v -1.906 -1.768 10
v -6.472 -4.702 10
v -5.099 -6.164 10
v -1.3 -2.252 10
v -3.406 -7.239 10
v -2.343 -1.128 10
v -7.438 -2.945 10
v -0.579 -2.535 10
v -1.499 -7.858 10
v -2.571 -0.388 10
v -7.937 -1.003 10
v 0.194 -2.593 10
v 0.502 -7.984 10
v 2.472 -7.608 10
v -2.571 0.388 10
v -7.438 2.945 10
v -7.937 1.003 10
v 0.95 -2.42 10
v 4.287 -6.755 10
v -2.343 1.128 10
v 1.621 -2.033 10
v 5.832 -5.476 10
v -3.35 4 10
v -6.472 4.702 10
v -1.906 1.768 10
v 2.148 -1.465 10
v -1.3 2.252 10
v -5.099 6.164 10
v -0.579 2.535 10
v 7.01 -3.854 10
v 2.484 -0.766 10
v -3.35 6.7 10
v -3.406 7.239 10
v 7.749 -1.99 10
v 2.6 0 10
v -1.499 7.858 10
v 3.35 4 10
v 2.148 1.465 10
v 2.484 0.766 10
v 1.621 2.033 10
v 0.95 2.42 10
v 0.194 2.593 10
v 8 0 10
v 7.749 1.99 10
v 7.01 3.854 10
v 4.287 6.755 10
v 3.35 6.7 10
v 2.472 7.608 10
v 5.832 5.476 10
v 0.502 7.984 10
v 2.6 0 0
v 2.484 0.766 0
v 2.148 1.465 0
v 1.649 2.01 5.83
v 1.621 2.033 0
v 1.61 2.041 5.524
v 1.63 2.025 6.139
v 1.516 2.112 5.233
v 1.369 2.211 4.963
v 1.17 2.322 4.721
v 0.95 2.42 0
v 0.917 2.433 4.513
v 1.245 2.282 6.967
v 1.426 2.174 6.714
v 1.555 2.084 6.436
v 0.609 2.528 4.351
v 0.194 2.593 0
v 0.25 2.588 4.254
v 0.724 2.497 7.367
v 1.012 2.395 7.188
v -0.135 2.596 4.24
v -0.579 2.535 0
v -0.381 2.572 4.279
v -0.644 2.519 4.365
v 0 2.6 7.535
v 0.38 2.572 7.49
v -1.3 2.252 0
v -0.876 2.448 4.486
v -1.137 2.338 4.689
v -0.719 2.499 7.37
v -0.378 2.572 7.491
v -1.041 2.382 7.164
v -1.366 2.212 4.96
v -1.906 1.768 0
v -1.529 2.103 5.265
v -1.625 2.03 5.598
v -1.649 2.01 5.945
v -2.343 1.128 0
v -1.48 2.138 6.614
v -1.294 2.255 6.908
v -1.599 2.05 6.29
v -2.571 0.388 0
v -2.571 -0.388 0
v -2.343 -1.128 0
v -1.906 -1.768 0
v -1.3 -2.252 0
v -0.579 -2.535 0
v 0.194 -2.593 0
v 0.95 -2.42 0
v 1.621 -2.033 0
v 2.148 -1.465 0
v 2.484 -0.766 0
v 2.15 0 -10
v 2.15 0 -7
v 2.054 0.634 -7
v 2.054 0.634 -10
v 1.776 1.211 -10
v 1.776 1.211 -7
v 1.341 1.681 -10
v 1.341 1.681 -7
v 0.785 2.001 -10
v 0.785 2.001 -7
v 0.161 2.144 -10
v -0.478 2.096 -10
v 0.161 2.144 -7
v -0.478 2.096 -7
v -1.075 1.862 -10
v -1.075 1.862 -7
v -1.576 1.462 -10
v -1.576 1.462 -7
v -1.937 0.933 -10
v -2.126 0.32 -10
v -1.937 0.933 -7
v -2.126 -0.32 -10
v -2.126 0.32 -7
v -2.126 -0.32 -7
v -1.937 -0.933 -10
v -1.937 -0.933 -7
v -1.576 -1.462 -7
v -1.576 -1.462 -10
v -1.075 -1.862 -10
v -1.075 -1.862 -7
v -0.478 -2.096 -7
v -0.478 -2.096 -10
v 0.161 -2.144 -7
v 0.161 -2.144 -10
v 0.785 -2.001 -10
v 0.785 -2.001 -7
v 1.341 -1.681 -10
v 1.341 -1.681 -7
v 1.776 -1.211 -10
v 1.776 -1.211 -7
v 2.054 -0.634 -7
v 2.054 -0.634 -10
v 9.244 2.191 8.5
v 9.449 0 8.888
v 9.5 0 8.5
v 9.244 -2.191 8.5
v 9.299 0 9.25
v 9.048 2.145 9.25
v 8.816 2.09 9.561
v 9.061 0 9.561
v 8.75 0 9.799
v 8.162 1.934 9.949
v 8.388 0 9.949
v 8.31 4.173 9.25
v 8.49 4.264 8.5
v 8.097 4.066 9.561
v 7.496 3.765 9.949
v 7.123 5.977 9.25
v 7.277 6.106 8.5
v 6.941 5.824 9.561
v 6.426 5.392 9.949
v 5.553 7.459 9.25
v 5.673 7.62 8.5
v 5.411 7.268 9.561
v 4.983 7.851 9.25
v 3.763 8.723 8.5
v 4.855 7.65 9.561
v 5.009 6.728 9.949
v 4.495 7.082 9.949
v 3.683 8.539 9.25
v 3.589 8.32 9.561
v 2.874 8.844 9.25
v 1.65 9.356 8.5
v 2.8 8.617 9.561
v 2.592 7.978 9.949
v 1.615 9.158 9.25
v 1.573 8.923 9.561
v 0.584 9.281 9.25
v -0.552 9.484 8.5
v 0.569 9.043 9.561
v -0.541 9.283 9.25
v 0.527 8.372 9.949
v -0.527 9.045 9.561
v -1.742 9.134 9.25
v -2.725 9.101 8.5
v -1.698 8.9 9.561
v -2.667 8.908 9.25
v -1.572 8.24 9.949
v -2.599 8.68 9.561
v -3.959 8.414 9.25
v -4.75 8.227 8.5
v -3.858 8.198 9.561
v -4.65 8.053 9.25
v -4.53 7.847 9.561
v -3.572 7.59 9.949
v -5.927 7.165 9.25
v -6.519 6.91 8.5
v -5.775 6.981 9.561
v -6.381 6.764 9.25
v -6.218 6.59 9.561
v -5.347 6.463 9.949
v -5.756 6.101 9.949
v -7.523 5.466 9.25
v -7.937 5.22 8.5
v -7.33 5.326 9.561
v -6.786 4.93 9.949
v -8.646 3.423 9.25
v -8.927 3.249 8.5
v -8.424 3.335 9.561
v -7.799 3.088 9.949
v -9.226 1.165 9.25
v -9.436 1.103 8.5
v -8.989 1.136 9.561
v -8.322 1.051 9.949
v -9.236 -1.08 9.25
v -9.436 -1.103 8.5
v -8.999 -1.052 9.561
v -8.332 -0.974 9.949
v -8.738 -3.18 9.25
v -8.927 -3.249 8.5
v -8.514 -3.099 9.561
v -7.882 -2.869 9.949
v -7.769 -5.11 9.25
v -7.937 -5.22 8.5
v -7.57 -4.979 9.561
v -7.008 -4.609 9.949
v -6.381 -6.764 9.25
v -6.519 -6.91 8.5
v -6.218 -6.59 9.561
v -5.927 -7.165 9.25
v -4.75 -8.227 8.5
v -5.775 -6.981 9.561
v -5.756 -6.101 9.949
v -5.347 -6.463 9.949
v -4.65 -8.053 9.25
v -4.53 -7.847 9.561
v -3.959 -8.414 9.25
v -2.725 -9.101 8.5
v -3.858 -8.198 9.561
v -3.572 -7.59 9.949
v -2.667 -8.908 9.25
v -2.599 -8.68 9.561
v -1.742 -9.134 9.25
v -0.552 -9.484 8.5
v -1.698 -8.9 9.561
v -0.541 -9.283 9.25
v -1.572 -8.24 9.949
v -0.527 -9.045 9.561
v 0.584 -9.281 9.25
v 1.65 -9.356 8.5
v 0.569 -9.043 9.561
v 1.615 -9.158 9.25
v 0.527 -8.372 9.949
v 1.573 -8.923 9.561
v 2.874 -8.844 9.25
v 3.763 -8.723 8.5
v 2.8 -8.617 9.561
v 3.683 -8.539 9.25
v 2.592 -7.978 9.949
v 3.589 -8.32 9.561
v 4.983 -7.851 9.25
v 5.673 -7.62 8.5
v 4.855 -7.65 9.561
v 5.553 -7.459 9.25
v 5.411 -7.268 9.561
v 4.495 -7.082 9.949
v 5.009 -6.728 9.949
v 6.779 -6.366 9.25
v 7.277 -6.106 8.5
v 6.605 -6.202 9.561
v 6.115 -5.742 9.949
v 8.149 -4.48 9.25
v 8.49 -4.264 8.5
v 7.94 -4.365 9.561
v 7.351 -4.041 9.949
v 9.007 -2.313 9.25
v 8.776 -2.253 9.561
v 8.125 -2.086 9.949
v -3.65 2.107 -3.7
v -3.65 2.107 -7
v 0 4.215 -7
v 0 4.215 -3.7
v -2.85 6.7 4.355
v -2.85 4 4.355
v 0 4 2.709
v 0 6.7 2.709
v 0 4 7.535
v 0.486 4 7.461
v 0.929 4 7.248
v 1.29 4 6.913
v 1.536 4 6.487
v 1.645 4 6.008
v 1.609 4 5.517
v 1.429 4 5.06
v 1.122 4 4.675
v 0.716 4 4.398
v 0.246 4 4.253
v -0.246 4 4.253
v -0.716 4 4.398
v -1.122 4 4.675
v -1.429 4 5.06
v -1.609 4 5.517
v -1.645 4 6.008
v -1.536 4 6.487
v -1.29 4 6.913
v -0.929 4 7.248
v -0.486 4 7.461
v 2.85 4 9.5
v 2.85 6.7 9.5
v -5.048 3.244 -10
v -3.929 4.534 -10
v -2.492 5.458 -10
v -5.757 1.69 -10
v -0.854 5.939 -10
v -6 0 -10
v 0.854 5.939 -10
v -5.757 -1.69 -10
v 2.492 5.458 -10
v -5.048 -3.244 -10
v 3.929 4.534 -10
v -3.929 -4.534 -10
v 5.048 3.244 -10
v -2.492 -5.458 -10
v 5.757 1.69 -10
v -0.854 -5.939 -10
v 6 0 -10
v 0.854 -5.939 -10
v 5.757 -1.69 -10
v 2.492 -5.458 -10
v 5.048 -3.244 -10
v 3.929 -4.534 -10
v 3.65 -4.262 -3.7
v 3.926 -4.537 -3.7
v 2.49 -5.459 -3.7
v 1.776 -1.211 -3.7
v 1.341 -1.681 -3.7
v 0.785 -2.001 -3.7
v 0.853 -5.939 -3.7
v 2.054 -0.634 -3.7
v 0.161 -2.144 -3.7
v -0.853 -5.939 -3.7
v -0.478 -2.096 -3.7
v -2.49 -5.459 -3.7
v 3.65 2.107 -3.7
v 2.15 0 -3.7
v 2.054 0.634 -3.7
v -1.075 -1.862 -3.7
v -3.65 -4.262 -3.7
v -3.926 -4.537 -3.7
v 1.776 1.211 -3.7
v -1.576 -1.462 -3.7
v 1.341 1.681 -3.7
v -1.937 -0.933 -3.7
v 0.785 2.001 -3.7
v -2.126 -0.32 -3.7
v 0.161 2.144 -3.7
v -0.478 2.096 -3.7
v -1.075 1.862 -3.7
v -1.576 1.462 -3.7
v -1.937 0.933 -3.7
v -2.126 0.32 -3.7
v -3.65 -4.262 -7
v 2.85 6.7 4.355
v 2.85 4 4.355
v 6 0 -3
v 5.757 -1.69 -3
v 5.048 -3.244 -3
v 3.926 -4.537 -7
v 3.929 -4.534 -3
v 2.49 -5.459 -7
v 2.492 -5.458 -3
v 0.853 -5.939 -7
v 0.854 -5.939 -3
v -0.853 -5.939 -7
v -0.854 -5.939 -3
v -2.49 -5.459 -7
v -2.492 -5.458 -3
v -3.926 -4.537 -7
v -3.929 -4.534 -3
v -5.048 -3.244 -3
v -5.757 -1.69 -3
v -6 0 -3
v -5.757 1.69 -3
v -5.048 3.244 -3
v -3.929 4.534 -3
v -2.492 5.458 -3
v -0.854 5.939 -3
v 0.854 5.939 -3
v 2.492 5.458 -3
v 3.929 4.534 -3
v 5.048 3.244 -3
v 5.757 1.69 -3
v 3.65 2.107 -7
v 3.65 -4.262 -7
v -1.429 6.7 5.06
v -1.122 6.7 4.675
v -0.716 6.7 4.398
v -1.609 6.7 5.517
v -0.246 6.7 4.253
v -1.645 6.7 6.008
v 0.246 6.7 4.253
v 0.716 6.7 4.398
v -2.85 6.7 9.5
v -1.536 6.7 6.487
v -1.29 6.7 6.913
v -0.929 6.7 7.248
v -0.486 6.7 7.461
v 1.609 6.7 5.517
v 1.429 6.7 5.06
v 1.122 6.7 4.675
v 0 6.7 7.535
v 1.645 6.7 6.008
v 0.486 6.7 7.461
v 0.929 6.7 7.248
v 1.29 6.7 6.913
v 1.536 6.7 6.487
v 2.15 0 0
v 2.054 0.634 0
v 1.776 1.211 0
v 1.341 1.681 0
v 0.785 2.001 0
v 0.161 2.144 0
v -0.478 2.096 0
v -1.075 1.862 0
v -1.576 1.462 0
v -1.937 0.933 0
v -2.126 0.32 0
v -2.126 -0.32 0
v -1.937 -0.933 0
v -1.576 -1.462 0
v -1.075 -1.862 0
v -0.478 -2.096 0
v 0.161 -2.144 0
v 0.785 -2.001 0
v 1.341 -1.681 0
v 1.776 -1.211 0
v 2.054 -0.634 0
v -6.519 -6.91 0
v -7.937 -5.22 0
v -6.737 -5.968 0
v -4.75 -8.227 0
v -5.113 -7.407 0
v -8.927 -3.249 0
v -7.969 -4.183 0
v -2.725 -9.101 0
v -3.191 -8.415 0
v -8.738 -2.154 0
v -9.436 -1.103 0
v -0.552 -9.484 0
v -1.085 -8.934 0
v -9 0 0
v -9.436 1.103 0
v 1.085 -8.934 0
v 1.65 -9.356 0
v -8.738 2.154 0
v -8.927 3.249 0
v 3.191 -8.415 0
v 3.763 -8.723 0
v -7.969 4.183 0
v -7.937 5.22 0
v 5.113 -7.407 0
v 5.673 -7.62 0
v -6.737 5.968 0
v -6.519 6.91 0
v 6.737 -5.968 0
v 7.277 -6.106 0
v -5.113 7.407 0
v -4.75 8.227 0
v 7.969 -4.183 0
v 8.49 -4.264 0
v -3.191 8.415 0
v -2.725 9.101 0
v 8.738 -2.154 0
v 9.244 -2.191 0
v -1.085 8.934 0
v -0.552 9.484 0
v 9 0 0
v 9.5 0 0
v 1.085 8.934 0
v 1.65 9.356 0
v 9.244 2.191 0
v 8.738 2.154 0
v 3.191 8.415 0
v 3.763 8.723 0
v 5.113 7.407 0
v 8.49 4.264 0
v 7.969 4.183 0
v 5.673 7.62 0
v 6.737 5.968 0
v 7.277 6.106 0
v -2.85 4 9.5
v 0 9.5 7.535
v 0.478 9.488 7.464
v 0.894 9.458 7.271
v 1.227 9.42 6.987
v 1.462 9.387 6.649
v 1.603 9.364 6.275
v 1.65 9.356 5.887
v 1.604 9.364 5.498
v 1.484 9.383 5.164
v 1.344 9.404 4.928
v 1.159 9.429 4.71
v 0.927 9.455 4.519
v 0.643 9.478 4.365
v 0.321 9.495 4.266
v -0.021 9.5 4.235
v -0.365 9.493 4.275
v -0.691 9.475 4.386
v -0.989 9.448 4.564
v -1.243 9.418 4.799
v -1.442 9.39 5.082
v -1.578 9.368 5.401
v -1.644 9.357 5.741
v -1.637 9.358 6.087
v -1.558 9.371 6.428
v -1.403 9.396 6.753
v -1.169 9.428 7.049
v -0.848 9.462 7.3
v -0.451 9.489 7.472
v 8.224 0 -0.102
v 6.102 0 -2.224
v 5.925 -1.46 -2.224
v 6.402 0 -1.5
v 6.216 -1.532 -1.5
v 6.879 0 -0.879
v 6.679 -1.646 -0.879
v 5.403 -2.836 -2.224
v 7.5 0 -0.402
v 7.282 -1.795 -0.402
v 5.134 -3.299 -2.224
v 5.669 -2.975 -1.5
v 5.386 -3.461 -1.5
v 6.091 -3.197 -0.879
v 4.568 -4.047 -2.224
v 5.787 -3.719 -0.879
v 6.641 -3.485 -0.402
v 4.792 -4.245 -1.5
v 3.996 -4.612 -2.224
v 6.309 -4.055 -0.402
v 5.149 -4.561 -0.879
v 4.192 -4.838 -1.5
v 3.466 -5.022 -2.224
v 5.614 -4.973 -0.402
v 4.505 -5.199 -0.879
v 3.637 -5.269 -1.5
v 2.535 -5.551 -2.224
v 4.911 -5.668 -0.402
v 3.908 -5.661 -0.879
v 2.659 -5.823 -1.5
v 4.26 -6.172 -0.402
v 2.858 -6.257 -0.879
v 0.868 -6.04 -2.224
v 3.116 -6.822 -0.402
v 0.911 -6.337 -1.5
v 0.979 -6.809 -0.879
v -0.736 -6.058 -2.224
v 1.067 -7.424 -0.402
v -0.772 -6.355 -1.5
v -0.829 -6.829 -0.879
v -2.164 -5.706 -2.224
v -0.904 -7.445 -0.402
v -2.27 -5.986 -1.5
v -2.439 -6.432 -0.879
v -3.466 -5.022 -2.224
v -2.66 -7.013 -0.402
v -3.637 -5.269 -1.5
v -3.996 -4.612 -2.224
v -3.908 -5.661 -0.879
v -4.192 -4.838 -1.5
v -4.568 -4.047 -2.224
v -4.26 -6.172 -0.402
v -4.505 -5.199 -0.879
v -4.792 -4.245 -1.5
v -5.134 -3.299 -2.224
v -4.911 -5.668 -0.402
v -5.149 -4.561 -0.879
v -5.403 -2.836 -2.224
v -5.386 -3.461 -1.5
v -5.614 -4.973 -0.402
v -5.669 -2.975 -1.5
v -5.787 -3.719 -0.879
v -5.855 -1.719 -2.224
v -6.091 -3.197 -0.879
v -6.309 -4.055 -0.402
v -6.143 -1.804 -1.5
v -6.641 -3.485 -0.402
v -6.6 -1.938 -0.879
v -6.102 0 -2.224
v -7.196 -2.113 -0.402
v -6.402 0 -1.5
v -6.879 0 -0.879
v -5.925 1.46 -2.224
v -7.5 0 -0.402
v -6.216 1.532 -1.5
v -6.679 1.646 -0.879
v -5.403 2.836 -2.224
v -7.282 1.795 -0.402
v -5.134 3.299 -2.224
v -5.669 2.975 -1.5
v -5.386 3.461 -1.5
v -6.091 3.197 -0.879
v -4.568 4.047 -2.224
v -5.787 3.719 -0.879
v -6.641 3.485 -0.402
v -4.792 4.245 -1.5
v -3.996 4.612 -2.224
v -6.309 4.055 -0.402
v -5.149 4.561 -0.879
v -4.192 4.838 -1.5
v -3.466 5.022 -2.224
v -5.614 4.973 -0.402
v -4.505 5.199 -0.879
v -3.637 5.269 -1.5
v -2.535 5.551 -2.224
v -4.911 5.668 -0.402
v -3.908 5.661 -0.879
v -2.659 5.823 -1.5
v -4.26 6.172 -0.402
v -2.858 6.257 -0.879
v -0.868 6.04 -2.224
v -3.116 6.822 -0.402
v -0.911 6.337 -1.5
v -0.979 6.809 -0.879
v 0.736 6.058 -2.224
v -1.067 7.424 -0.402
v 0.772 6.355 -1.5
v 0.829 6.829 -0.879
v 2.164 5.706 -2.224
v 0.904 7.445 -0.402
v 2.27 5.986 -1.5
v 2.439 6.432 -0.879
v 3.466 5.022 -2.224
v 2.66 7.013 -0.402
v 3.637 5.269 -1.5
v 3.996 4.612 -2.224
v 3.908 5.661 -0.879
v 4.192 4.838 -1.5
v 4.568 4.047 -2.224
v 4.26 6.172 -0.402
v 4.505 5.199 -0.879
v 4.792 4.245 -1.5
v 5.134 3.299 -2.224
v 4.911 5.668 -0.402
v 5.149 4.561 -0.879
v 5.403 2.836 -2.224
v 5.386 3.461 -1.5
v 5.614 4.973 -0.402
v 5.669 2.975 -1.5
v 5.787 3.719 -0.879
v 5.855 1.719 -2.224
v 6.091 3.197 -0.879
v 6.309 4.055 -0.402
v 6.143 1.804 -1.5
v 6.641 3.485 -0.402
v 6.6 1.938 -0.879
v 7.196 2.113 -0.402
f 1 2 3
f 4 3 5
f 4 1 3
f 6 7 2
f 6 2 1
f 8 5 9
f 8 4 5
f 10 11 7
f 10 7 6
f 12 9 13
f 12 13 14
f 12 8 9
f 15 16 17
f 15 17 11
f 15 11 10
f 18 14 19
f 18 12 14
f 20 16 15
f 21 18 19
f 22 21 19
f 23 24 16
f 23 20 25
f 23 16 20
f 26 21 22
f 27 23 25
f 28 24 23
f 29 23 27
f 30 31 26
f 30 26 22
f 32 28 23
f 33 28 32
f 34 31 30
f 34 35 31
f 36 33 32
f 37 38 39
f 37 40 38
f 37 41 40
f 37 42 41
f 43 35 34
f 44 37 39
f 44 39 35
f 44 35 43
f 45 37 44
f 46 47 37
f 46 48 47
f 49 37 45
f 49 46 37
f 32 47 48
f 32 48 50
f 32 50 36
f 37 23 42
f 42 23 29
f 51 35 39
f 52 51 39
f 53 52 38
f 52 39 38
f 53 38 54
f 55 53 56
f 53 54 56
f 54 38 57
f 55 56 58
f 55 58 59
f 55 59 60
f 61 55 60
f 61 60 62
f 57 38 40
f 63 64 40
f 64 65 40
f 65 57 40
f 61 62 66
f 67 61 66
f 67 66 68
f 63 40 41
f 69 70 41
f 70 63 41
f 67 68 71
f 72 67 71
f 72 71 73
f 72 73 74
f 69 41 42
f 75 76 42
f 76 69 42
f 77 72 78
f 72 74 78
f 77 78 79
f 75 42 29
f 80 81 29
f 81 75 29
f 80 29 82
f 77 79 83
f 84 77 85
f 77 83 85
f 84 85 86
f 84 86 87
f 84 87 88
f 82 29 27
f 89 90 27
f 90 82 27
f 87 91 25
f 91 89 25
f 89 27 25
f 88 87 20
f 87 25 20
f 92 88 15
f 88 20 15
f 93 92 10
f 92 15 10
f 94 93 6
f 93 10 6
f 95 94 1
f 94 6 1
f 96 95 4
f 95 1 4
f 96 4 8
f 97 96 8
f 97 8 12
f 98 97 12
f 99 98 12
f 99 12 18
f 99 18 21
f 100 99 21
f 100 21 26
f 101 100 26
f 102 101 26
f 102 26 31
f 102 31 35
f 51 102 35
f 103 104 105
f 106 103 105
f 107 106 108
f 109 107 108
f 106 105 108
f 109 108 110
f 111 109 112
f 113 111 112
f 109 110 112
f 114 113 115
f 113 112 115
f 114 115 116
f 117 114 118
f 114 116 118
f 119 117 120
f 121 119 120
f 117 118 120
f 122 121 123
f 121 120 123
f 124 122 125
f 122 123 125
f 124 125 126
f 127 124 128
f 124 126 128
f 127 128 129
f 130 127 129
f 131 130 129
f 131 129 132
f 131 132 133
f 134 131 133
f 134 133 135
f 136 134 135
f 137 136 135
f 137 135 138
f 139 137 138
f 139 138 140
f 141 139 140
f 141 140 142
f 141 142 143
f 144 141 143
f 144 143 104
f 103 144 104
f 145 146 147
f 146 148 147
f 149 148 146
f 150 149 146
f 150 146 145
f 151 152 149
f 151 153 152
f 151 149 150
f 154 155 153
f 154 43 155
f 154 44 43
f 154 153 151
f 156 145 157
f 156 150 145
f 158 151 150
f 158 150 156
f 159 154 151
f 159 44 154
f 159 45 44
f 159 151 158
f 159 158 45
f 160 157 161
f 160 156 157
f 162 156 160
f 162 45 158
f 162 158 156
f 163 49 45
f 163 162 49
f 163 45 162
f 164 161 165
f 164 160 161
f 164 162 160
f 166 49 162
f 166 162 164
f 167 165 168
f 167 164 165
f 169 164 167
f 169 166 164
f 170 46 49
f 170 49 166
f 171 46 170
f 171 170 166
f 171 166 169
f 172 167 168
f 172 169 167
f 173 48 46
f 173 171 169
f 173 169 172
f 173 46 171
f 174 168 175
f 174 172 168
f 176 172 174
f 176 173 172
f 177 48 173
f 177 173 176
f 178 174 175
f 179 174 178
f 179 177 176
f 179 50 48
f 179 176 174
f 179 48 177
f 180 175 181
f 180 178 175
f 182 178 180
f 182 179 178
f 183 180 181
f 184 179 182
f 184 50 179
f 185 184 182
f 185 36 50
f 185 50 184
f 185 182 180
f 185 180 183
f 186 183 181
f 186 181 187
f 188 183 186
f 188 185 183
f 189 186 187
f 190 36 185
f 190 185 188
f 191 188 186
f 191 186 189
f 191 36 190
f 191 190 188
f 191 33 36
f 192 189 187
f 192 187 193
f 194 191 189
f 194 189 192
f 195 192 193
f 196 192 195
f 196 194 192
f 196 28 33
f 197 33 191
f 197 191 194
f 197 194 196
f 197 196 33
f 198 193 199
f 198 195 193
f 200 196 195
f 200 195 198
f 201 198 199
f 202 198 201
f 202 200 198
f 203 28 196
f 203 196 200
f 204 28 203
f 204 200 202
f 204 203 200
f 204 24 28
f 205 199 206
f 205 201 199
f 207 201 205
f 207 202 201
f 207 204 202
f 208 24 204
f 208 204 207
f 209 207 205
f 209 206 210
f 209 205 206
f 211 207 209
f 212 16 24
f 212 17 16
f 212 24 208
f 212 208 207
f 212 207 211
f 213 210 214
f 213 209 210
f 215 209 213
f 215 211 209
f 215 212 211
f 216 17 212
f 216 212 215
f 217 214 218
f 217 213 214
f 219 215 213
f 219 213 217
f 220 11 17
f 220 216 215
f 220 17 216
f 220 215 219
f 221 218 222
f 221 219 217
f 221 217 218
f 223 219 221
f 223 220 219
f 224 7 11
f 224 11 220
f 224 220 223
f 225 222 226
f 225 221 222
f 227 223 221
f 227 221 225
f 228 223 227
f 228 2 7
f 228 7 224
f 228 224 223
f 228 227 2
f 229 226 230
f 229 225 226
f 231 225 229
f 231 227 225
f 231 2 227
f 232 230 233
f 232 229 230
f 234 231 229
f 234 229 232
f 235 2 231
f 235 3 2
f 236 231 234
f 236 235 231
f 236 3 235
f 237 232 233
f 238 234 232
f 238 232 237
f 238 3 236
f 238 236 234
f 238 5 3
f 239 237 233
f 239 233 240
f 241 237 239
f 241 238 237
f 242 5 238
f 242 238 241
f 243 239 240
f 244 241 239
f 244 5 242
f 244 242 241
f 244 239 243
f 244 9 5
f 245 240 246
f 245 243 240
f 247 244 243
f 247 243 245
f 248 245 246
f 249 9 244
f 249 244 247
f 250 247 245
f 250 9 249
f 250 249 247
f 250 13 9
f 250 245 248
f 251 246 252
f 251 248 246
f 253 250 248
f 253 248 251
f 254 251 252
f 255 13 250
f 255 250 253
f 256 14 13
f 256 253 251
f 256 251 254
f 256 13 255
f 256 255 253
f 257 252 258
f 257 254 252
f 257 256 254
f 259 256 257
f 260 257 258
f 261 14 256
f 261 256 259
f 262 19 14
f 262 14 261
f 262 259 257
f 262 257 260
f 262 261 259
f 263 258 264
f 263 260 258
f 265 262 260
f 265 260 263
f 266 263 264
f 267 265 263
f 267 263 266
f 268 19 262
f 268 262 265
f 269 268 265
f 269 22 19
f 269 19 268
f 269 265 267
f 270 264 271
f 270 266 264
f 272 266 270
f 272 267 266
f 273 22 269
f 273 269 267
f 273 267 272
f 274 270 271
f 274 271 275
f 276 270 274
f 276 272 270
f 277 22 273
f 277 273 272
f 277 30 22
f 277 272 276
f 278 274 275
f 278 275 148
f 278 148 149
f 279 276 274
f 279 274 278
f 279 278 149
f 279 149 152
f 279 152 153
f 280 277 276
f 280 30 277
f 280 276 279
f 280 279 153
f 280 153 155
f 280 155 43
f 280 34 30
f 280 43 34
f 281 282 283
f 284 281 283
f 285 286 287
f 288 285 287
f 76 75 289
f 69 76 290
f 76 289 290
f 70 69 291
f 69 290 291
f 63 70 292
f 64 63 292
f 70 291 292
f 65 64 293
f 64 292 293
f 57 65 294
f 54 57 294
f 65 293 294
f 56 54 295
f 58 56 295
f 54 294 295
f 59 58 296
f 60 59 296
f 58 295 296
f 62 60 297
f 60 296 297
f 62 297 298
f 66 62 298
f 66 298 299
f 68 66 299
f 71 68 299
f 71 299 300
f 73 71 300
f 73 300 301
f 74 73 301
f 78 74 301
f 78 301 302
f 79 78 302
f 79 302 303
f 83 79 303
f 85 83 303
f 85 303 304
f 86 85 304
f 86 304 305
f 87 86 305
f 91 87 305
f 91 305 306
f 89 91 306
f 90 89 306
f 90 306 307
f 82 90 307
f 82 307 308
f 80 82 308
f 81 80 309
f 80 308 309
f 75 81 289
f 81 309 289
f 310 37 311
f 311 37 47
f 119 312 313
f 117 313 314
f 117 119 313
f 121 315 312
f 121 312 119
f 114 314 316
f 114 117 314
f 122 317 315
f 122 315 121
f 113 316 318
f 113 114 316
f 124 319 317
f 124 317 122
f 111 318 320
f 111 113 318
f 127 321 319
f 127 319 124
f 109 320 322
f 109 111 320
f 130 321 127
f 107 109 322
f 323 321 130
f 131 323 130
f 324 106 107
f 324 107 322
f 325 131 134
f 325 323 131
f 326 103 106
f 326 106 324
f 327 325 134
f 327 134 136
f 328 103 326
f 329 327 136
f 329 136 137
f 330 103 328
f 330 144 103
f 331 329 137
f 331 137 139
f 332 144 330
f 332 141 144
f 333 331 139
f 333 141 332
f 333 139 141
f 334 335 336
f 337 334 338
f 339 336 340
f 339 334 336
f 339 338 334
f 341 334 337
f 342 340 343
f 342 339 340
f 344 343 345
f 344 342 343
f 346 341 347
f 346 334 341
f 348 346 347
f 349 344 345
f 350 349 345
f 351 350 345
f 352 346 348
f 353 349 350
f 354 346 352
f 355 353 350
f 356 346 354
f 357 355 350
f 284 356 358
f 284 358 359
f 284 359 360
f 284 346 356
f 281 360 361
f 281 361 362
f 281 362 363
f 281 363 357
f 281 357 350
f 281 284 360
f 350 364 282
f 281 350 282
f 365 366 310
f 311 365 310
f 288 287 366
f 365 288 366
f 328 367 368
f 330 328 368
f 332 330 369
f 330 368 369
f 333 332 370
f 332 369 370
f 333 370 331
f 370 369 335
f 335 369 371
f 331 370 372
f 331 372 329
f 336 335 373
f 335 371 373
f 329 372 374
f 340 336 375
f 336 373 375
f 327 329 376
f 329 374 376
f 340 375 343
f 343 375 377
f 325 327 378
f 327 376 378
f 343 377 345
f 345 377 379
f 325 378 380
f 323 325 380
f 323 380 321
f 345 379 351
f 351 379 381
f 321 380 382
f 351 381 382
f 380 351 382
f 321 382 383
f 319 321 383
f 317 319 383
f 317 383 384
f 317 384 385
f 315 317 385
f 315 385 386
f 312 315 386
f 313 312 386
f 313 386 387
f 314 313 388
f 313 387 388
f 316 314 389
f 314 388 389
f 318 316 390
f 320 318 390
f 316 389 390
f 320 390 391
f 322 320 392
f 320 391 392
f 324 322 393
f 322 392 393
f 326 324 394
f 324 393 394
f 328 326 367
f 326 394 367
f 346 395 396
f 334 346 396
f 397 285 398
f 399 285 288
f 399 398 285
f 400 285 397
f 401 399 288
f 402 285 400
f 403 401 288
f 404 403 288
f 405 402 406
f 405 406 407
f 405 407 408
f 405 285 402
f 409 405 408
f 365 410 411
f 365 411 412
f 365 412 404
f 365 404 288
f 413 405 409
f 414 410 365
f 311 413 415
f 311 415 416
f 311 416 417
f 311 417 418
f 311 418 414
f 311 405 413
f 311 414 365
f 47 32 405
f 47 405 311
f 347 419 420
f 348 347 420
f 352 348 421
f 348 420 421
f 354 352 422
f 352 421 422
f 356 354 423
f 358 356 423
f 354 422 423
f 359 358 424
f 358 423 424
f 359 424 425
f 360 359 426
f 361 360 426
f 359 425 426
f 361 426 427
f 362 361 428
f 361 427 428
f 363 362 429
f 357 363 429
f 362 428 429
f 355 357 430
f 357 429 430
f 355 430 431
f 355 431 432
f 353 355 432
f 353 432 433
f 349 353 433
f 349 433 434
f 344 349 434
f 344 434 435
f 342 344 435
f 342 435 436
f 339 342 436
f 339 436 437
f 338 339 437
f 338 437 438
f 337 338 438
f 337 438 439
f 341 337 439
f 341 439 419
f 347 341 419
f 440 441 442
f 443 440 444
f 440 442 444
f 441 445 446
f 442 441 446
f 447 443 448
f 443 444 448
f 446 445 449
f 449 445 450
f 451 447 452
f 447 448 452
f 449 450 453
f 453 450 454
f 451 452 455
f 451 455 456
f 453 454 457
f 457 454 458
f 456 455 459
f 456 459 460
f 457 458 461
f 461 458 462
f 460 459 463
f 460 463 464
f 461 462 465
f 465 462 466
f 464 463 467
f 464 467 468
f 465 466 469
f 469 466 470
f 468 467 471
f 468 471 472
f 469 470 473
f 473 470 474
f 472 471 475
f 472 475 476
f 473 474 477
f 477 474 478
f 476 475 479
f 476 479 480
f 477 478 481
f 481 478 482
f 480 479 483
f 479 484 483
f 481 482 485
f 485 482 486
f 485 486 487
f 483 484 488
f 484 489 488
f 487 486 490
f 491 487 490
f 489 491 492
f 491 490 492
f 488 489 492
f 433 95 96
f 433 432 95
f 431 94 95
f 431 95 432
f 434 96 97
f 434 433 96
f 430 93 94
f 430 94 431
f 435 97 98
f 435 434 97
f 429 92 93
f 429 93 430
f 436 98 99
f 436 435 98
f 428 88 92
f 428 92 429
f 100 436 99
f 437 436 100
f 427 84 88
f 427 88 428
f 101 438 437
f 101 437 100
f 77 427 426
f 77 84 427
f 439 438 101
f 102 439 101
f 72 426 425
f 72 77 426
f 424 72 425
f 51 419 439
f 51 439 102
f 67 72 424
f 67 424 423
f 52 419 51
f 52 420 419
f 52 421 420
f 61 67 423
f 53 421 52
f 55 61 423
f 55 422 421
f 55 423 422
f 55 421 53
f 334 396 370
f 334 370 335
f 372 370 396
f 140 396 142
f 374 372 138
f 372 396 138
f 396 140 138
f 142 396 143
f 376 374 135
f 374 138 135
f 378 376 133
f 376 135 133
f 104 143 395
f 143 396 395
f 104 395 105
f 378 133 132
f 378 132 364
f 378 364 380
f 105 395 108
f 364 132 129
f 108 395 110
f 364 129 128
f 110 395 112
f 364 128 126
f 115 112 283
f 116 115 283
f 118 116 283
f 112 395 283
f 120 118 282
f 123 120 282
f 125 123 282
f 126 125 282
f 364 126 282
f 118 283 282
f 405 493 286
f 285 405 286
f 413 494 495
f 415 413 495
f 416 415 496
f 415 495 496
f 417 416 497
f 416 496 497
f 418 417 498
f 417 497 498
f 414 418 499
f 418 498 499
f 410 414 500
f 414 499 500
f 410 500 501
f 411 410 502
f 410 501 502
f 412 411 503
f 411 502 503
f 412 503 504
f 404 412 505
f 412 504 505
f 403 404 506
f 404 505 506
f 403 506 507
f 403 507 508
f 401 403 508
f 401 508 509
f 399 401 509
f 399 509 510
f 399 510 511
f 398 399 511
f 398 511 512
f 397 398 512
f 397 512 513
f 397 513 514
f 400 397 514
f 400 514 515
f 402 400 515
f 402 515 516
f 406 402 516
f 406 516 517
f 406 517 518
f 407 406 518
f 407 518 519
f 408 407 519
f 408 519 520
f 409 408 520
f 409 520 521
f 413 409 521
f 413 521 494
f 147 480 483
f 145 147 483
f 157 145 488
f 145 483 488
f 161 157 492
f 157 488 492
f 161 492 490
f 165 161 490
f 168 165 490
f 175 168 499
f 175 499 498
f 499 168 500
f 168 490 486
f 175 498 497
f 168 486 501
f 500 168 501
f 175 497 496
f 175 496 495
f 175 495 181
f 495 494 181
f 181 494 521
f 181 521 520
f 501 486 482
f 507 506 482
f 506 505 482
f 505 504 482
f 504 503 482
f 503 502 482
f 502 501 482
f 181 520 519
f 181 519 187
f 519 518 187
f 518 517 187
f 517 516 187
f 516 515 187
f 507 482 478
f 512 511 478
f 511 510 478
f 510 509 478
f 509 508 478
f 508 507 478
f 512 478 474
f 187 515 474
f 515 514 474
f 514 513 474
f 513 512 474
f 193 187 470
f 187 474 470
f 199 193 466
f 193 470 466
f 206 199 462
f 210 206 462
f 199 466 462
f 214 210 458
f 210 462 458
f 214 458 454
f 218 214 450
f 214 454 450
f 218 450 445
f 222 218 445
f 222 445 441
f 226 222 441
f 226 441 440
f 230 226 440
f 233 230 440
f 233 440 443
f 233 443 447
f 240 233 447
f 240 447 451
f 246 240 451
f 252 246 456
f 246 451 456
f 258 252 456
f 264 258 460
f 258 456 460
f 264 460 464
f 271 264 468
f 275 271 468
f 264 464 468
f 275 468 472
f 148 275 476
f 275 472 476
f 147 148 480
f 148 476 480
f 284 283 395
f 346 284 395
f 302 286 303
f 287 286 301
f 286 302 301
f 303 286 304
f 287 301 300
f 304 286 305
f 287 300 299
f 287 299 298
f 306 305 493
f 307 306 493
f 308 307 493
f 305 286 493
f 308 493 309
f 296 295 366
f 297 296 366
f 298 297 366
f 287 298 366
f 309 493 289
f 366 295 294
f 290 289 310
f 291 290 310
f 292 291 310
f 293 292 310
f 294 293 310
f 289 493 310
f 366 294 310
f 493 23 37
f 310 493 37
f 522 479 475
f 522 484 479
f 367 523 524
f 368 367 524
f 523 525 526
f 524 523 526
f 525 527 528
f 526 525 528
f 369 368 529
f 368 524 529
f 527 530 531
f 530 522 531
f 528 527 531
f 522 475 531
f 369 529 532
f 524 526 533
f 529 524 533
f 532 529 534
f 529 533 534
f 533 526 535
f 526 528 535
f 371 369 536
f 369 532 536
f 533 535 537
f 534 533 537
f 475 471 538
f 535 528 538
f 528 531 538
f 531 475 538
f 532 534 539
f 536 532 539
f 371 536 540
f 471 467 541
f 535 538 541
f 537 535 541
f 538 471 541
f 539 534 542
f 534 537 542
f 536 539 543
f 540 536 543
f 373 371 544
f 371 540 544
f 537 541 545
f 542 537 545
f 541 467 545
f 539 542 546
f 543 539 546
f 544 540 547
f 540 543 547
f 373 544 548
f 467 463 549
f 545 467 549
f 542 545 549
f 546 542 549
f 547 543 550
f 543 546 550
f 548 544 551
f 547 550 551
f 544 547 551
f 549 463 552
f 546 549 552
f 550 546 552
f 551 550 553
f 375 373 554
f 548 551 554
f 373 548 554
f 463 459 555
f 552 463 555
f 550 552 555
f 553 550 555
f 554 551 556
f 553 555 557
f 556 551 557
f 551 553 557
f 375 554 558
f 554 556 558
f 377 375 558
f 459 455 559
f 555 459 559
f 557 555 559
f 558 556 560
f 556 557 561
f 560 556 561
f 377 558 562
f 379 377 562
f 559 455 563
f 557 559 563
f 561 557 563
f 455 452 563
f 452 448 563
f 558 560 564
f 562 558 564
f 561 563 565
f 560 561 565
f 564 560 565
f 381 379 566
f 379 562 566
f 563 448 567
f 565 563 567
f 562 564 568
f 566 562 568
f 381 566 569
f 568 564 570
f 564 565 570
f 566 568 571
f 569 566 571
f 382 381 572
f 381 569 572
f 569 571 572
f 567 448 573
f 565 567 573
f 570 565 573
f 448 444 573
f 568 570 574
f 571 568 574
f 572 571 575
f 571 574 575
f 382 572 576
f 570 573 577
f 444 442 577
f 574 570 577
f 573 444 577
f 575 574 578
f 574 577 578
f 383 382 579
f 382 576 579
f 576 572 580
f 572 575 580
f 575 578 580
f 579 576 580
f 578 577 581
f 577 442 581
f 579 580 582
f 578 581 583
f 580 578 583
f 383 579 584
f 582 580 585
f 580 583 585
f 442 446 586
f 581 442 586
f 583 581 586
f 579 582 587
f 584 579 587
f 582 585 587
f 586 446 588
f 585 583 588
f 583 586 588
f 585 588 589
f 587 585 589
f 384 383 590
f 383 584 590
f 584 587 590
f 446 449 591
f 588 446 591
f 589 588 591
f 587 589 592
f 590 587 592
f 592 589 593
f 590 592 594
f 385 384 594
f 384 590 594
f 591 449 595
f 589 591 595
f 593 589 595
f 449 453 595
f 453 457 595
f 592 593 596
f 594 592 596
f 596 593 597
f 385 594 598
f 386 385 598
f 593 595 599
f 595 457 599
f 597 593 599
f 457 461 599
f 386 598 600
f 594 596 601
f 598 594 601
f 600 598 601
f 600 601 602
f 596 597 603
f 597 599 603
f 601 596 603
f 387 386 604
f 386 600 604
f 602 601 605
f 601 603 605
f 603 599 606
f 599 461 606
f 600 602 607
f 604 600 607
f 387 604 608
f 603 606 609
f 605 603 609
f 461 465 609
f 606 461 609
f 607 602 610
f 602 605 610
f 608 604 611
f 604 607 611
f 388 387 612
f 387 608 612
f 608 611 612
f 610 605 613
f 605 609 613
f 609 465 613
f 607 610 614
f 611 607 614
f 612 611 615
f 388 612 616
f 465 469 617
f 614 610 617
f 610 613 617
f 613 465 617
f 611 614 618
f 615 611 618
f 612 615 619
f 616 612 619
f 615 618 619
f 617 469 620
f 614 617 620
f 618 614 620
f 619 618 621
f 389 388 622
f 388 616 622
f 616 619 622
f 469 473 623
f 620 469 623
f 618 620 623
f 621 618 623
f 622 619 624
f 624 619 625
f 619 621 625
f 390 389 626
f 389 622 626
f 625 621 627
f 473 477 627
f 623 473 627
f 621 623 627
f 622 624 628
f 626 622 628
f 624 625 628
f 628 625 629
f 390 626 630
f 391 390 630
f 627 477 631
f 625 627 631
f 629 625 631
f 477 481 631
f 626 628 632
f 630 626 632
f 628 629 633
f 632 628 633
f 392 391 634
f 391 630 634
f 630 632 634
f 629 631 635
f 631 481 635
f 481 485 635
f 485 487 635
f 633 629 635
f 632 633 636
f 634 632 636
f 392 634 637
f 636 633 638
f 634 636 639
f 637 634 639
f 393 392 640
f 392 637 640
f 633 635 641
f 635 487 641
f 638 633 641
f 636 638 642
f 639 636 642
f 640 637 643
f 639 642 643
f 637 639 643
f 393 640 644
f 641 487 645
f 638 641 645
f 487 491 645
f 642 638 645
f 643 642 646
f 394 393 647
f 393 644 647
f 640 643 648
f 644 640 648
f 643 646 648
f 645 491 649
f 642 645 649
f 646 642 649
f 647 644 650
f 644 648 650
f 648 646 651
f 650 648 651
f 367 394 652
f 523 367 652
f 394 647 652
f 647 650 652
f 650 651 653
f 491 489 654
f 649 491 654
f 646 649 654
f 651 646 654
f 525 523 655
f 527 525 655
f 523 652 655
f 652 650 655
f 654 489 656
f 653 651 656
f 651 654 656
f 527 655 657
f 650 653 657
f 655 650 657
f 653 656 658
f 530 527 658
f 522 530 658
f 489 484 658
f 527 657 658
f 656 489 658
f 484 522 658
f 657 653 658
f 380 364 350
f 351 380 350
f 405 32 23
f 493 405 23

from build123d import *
from OCP.BRepFilletAPI import BRepFilletAPI_MakeChamfer

# Parameters (mm, degrees)
SKETCH1_R               = 9.5
BOSS_EXTRUDE1_DEPTH     = 10
SKETCH6_R               = 6
BOSS_EXTRUDE2_DEPTH     = 10
SKETCH2_R               = 2.6
CUT_EXTRUDE1_DEPTH      = 10
SKETCH3_R               = 2.15
CUT_EXTRUDE2_DEPTH      = 17.748134224
CUT_EXTRUDE3_DEPTH      = 3.3
CUT_EXTRUDE4_DEPTH      = 2.7
CUT_EXTRUDE5_REACH      = 25.479
CUT_EXTRUDE5_END_RADIUS = 2.6
SKETCH7_R               = 1.65
FILLET1_R               = 3
CHAMFER1_SIZE           = 0.356629571
CHAMFER1_SIZE_2         = 0.5
CHAMFER2_SIZE           = 0.5
FILLET2_R               = 1.5


with BuildPart() as part:
    # Sketch1 → Boss-Extrude1 (new body)
    with BuildSketch(Plane.XY):
        Circle(SKETCH1_R)
    extrude(amount=BOSS_EXTRUDE1_DEPTH)

    # Sketch6 → Boss-Extrude2 (add)
    with BuildSketch(Plane(origin=(0, 0, 0), x_dir=(-1, 0, 0), z_dir=(0, 0, -1))):
        with Locations(Location((0, 0, 0), (0, 0, 180))):
            Circle(SKETCH6_R)
    extrude(amount=BOSS_EXTRUDE2_DEPTH)

    # Sketch2 → Cut-Extrude1 (cut)
    with BuildSketch(Plane.XY.offset(10)):
        Circle(SKETCH2_R)
    extrude(amount=-CUT_EXTRUDE1_DEPTH, mode=Mode.SUBTRACT)

    # Sketch3 → Cut-Extrude2 (cut, through all)
    with BuildSketch(Plane.XY):
        Circle(SKETCH3_R)
    extrude(amount=-CUT_EXTRUDE2_DEPTH, mode=Mode.SUBTRACT)

    # Sketch4 → Cut-Extrude3 (cut)
    with BuildSketch(Plane(origin=(0, 0, -7), x_dir=(-1, 0, 0), z_dir=(0, 0, -1))):
        Polygon((-3.65, -9.105308986), (3.65, -9.105308986), (3.65, 2.107328483), (0, 4.214656965), (-3.65, 2.107328483), align=None)
    extrude(amount=-CUT_EXTRUDE3_DEPTH, mode=Mode.SUBTRACT)

    # Sketch5 → Cut-Extrude4 (cut)
    with BuildSketch(Plane(origin=(0, 4, 0), x_dir=(-1, 0, 0), z_dir=(0, 1, 0))):
        Polygon((-2.85, 11.49401058), (2.85, 11.49401058), (2.85, 4.354551733), (0, 2.709103466), (-2.85, 4.354551733), align=None)
    extrude(amount=CUT_EXTRUDE4_DEPTH, mode=Mode.SUBTRACT)

    # Cut-Extrude5: up to this cylinder (the profile starts outside it)
    cut_extrude5_end = Plane(origin=(0, 0, 5.88453), z_dir=(0, 0, 1)) * Cylinder(CUT_EXTRUDE5_END_RADIUS, 57.158, mode=Mode.PRIVATE)
    # Sketch7 → Cut-Extrude5 (cut, up to the surface)
    with BuildSketch(Plane(origin=(0, 9.5, 0), x_dir=(-1, 0, 0), z_dir=(0, 1, 0)), mode=Mode.PRIVATE) as cut_extrude5_sk1:
        with Locations(Location((0, 5.884529946, 0), (0, 0, 90))):
            Circle(SKETCH7_R)
    cut_extrude5_tool1 = extrude(cut_extrude5_sk1.sketch, amount=-CUT_EXTRUDE5_REACH, mode=Mode.PRIVATE) - cut_extrude5_end
    add(cut_extrude5_tool1.solids().sort_by_distance((0, 9.5, 5.88453))[0], mode=Mode.SUBTRACT)

    # Fillet1
    fillet1_edges = [part.edges().sort_by_distance(p)[0] for p in [
        (-6, 0, 0),
    ]]
    fillet(fillet1_edges, radius=FILLET1_R)

    # Chamfer1
    chamfer1_edges_1 = [part.edges().sort_by_distance(p)[0] for p in [
        (-3.65, -4.762089877, -5.35),
    ]]
    chamfer1_side_1 = [part.faces().sort_by_distance(p)[0] for p in [
        (-3.655661007, -4.757750884, -5.35),
    ]]
    chamfer1_edges_2 = [part.edges().sort_by_distance(p)[0] for p in [
        (3.65, -4.762089877, -5.35),
    ]]
    chamfer1_side_2 = [part.faces().sort_by_distance(p)[0] for p in [
        (3.655661007, -4.757750884, -5.35),
    ]]
    chamfer1 = BRepFilletAPI_MakeChamfer(part.part.solid().wrapped)
    for e in chamfer1_edges_1:
        chamfer1.Add(CHAMFER1_SIZE - 0.0004, CHAMFER1_SIZE_2 - 0.0004, e.wrapped, chamfer1_side_1[0].wrapped)
    for e in chamfer1_edges_2:
        chamfer1.Add(CHAMFER1_SIZE - 0.0004, CHAMFER1_SIZE_2 - 0.0004, e.wrapped, chamfer1_side_2[0].wrapped)
    add(Compound.cast(chamfer1.Shape()), mode=Mode.REPLACE)  # a hair under: the kernel refuses the full size

    # Chamfer2
    chamfer2_edges = [part.edges().sort_by_distance(p)[0] for p in [
        (-2.85, 5.35, 10),
        (2.85, 5.35, 10),
    ]]
    chamfer(chamfer2_edges, length=CHAMFER2_SIZE)

    # Fillet2
    fillet2_edges = [part.edges().sort_by_distance(p)[0] for p in [
        (-9.5, 0, 10),
    ]]
    fillet(fillet2_edges, radius=FILLET2_R)


solid = part.part
